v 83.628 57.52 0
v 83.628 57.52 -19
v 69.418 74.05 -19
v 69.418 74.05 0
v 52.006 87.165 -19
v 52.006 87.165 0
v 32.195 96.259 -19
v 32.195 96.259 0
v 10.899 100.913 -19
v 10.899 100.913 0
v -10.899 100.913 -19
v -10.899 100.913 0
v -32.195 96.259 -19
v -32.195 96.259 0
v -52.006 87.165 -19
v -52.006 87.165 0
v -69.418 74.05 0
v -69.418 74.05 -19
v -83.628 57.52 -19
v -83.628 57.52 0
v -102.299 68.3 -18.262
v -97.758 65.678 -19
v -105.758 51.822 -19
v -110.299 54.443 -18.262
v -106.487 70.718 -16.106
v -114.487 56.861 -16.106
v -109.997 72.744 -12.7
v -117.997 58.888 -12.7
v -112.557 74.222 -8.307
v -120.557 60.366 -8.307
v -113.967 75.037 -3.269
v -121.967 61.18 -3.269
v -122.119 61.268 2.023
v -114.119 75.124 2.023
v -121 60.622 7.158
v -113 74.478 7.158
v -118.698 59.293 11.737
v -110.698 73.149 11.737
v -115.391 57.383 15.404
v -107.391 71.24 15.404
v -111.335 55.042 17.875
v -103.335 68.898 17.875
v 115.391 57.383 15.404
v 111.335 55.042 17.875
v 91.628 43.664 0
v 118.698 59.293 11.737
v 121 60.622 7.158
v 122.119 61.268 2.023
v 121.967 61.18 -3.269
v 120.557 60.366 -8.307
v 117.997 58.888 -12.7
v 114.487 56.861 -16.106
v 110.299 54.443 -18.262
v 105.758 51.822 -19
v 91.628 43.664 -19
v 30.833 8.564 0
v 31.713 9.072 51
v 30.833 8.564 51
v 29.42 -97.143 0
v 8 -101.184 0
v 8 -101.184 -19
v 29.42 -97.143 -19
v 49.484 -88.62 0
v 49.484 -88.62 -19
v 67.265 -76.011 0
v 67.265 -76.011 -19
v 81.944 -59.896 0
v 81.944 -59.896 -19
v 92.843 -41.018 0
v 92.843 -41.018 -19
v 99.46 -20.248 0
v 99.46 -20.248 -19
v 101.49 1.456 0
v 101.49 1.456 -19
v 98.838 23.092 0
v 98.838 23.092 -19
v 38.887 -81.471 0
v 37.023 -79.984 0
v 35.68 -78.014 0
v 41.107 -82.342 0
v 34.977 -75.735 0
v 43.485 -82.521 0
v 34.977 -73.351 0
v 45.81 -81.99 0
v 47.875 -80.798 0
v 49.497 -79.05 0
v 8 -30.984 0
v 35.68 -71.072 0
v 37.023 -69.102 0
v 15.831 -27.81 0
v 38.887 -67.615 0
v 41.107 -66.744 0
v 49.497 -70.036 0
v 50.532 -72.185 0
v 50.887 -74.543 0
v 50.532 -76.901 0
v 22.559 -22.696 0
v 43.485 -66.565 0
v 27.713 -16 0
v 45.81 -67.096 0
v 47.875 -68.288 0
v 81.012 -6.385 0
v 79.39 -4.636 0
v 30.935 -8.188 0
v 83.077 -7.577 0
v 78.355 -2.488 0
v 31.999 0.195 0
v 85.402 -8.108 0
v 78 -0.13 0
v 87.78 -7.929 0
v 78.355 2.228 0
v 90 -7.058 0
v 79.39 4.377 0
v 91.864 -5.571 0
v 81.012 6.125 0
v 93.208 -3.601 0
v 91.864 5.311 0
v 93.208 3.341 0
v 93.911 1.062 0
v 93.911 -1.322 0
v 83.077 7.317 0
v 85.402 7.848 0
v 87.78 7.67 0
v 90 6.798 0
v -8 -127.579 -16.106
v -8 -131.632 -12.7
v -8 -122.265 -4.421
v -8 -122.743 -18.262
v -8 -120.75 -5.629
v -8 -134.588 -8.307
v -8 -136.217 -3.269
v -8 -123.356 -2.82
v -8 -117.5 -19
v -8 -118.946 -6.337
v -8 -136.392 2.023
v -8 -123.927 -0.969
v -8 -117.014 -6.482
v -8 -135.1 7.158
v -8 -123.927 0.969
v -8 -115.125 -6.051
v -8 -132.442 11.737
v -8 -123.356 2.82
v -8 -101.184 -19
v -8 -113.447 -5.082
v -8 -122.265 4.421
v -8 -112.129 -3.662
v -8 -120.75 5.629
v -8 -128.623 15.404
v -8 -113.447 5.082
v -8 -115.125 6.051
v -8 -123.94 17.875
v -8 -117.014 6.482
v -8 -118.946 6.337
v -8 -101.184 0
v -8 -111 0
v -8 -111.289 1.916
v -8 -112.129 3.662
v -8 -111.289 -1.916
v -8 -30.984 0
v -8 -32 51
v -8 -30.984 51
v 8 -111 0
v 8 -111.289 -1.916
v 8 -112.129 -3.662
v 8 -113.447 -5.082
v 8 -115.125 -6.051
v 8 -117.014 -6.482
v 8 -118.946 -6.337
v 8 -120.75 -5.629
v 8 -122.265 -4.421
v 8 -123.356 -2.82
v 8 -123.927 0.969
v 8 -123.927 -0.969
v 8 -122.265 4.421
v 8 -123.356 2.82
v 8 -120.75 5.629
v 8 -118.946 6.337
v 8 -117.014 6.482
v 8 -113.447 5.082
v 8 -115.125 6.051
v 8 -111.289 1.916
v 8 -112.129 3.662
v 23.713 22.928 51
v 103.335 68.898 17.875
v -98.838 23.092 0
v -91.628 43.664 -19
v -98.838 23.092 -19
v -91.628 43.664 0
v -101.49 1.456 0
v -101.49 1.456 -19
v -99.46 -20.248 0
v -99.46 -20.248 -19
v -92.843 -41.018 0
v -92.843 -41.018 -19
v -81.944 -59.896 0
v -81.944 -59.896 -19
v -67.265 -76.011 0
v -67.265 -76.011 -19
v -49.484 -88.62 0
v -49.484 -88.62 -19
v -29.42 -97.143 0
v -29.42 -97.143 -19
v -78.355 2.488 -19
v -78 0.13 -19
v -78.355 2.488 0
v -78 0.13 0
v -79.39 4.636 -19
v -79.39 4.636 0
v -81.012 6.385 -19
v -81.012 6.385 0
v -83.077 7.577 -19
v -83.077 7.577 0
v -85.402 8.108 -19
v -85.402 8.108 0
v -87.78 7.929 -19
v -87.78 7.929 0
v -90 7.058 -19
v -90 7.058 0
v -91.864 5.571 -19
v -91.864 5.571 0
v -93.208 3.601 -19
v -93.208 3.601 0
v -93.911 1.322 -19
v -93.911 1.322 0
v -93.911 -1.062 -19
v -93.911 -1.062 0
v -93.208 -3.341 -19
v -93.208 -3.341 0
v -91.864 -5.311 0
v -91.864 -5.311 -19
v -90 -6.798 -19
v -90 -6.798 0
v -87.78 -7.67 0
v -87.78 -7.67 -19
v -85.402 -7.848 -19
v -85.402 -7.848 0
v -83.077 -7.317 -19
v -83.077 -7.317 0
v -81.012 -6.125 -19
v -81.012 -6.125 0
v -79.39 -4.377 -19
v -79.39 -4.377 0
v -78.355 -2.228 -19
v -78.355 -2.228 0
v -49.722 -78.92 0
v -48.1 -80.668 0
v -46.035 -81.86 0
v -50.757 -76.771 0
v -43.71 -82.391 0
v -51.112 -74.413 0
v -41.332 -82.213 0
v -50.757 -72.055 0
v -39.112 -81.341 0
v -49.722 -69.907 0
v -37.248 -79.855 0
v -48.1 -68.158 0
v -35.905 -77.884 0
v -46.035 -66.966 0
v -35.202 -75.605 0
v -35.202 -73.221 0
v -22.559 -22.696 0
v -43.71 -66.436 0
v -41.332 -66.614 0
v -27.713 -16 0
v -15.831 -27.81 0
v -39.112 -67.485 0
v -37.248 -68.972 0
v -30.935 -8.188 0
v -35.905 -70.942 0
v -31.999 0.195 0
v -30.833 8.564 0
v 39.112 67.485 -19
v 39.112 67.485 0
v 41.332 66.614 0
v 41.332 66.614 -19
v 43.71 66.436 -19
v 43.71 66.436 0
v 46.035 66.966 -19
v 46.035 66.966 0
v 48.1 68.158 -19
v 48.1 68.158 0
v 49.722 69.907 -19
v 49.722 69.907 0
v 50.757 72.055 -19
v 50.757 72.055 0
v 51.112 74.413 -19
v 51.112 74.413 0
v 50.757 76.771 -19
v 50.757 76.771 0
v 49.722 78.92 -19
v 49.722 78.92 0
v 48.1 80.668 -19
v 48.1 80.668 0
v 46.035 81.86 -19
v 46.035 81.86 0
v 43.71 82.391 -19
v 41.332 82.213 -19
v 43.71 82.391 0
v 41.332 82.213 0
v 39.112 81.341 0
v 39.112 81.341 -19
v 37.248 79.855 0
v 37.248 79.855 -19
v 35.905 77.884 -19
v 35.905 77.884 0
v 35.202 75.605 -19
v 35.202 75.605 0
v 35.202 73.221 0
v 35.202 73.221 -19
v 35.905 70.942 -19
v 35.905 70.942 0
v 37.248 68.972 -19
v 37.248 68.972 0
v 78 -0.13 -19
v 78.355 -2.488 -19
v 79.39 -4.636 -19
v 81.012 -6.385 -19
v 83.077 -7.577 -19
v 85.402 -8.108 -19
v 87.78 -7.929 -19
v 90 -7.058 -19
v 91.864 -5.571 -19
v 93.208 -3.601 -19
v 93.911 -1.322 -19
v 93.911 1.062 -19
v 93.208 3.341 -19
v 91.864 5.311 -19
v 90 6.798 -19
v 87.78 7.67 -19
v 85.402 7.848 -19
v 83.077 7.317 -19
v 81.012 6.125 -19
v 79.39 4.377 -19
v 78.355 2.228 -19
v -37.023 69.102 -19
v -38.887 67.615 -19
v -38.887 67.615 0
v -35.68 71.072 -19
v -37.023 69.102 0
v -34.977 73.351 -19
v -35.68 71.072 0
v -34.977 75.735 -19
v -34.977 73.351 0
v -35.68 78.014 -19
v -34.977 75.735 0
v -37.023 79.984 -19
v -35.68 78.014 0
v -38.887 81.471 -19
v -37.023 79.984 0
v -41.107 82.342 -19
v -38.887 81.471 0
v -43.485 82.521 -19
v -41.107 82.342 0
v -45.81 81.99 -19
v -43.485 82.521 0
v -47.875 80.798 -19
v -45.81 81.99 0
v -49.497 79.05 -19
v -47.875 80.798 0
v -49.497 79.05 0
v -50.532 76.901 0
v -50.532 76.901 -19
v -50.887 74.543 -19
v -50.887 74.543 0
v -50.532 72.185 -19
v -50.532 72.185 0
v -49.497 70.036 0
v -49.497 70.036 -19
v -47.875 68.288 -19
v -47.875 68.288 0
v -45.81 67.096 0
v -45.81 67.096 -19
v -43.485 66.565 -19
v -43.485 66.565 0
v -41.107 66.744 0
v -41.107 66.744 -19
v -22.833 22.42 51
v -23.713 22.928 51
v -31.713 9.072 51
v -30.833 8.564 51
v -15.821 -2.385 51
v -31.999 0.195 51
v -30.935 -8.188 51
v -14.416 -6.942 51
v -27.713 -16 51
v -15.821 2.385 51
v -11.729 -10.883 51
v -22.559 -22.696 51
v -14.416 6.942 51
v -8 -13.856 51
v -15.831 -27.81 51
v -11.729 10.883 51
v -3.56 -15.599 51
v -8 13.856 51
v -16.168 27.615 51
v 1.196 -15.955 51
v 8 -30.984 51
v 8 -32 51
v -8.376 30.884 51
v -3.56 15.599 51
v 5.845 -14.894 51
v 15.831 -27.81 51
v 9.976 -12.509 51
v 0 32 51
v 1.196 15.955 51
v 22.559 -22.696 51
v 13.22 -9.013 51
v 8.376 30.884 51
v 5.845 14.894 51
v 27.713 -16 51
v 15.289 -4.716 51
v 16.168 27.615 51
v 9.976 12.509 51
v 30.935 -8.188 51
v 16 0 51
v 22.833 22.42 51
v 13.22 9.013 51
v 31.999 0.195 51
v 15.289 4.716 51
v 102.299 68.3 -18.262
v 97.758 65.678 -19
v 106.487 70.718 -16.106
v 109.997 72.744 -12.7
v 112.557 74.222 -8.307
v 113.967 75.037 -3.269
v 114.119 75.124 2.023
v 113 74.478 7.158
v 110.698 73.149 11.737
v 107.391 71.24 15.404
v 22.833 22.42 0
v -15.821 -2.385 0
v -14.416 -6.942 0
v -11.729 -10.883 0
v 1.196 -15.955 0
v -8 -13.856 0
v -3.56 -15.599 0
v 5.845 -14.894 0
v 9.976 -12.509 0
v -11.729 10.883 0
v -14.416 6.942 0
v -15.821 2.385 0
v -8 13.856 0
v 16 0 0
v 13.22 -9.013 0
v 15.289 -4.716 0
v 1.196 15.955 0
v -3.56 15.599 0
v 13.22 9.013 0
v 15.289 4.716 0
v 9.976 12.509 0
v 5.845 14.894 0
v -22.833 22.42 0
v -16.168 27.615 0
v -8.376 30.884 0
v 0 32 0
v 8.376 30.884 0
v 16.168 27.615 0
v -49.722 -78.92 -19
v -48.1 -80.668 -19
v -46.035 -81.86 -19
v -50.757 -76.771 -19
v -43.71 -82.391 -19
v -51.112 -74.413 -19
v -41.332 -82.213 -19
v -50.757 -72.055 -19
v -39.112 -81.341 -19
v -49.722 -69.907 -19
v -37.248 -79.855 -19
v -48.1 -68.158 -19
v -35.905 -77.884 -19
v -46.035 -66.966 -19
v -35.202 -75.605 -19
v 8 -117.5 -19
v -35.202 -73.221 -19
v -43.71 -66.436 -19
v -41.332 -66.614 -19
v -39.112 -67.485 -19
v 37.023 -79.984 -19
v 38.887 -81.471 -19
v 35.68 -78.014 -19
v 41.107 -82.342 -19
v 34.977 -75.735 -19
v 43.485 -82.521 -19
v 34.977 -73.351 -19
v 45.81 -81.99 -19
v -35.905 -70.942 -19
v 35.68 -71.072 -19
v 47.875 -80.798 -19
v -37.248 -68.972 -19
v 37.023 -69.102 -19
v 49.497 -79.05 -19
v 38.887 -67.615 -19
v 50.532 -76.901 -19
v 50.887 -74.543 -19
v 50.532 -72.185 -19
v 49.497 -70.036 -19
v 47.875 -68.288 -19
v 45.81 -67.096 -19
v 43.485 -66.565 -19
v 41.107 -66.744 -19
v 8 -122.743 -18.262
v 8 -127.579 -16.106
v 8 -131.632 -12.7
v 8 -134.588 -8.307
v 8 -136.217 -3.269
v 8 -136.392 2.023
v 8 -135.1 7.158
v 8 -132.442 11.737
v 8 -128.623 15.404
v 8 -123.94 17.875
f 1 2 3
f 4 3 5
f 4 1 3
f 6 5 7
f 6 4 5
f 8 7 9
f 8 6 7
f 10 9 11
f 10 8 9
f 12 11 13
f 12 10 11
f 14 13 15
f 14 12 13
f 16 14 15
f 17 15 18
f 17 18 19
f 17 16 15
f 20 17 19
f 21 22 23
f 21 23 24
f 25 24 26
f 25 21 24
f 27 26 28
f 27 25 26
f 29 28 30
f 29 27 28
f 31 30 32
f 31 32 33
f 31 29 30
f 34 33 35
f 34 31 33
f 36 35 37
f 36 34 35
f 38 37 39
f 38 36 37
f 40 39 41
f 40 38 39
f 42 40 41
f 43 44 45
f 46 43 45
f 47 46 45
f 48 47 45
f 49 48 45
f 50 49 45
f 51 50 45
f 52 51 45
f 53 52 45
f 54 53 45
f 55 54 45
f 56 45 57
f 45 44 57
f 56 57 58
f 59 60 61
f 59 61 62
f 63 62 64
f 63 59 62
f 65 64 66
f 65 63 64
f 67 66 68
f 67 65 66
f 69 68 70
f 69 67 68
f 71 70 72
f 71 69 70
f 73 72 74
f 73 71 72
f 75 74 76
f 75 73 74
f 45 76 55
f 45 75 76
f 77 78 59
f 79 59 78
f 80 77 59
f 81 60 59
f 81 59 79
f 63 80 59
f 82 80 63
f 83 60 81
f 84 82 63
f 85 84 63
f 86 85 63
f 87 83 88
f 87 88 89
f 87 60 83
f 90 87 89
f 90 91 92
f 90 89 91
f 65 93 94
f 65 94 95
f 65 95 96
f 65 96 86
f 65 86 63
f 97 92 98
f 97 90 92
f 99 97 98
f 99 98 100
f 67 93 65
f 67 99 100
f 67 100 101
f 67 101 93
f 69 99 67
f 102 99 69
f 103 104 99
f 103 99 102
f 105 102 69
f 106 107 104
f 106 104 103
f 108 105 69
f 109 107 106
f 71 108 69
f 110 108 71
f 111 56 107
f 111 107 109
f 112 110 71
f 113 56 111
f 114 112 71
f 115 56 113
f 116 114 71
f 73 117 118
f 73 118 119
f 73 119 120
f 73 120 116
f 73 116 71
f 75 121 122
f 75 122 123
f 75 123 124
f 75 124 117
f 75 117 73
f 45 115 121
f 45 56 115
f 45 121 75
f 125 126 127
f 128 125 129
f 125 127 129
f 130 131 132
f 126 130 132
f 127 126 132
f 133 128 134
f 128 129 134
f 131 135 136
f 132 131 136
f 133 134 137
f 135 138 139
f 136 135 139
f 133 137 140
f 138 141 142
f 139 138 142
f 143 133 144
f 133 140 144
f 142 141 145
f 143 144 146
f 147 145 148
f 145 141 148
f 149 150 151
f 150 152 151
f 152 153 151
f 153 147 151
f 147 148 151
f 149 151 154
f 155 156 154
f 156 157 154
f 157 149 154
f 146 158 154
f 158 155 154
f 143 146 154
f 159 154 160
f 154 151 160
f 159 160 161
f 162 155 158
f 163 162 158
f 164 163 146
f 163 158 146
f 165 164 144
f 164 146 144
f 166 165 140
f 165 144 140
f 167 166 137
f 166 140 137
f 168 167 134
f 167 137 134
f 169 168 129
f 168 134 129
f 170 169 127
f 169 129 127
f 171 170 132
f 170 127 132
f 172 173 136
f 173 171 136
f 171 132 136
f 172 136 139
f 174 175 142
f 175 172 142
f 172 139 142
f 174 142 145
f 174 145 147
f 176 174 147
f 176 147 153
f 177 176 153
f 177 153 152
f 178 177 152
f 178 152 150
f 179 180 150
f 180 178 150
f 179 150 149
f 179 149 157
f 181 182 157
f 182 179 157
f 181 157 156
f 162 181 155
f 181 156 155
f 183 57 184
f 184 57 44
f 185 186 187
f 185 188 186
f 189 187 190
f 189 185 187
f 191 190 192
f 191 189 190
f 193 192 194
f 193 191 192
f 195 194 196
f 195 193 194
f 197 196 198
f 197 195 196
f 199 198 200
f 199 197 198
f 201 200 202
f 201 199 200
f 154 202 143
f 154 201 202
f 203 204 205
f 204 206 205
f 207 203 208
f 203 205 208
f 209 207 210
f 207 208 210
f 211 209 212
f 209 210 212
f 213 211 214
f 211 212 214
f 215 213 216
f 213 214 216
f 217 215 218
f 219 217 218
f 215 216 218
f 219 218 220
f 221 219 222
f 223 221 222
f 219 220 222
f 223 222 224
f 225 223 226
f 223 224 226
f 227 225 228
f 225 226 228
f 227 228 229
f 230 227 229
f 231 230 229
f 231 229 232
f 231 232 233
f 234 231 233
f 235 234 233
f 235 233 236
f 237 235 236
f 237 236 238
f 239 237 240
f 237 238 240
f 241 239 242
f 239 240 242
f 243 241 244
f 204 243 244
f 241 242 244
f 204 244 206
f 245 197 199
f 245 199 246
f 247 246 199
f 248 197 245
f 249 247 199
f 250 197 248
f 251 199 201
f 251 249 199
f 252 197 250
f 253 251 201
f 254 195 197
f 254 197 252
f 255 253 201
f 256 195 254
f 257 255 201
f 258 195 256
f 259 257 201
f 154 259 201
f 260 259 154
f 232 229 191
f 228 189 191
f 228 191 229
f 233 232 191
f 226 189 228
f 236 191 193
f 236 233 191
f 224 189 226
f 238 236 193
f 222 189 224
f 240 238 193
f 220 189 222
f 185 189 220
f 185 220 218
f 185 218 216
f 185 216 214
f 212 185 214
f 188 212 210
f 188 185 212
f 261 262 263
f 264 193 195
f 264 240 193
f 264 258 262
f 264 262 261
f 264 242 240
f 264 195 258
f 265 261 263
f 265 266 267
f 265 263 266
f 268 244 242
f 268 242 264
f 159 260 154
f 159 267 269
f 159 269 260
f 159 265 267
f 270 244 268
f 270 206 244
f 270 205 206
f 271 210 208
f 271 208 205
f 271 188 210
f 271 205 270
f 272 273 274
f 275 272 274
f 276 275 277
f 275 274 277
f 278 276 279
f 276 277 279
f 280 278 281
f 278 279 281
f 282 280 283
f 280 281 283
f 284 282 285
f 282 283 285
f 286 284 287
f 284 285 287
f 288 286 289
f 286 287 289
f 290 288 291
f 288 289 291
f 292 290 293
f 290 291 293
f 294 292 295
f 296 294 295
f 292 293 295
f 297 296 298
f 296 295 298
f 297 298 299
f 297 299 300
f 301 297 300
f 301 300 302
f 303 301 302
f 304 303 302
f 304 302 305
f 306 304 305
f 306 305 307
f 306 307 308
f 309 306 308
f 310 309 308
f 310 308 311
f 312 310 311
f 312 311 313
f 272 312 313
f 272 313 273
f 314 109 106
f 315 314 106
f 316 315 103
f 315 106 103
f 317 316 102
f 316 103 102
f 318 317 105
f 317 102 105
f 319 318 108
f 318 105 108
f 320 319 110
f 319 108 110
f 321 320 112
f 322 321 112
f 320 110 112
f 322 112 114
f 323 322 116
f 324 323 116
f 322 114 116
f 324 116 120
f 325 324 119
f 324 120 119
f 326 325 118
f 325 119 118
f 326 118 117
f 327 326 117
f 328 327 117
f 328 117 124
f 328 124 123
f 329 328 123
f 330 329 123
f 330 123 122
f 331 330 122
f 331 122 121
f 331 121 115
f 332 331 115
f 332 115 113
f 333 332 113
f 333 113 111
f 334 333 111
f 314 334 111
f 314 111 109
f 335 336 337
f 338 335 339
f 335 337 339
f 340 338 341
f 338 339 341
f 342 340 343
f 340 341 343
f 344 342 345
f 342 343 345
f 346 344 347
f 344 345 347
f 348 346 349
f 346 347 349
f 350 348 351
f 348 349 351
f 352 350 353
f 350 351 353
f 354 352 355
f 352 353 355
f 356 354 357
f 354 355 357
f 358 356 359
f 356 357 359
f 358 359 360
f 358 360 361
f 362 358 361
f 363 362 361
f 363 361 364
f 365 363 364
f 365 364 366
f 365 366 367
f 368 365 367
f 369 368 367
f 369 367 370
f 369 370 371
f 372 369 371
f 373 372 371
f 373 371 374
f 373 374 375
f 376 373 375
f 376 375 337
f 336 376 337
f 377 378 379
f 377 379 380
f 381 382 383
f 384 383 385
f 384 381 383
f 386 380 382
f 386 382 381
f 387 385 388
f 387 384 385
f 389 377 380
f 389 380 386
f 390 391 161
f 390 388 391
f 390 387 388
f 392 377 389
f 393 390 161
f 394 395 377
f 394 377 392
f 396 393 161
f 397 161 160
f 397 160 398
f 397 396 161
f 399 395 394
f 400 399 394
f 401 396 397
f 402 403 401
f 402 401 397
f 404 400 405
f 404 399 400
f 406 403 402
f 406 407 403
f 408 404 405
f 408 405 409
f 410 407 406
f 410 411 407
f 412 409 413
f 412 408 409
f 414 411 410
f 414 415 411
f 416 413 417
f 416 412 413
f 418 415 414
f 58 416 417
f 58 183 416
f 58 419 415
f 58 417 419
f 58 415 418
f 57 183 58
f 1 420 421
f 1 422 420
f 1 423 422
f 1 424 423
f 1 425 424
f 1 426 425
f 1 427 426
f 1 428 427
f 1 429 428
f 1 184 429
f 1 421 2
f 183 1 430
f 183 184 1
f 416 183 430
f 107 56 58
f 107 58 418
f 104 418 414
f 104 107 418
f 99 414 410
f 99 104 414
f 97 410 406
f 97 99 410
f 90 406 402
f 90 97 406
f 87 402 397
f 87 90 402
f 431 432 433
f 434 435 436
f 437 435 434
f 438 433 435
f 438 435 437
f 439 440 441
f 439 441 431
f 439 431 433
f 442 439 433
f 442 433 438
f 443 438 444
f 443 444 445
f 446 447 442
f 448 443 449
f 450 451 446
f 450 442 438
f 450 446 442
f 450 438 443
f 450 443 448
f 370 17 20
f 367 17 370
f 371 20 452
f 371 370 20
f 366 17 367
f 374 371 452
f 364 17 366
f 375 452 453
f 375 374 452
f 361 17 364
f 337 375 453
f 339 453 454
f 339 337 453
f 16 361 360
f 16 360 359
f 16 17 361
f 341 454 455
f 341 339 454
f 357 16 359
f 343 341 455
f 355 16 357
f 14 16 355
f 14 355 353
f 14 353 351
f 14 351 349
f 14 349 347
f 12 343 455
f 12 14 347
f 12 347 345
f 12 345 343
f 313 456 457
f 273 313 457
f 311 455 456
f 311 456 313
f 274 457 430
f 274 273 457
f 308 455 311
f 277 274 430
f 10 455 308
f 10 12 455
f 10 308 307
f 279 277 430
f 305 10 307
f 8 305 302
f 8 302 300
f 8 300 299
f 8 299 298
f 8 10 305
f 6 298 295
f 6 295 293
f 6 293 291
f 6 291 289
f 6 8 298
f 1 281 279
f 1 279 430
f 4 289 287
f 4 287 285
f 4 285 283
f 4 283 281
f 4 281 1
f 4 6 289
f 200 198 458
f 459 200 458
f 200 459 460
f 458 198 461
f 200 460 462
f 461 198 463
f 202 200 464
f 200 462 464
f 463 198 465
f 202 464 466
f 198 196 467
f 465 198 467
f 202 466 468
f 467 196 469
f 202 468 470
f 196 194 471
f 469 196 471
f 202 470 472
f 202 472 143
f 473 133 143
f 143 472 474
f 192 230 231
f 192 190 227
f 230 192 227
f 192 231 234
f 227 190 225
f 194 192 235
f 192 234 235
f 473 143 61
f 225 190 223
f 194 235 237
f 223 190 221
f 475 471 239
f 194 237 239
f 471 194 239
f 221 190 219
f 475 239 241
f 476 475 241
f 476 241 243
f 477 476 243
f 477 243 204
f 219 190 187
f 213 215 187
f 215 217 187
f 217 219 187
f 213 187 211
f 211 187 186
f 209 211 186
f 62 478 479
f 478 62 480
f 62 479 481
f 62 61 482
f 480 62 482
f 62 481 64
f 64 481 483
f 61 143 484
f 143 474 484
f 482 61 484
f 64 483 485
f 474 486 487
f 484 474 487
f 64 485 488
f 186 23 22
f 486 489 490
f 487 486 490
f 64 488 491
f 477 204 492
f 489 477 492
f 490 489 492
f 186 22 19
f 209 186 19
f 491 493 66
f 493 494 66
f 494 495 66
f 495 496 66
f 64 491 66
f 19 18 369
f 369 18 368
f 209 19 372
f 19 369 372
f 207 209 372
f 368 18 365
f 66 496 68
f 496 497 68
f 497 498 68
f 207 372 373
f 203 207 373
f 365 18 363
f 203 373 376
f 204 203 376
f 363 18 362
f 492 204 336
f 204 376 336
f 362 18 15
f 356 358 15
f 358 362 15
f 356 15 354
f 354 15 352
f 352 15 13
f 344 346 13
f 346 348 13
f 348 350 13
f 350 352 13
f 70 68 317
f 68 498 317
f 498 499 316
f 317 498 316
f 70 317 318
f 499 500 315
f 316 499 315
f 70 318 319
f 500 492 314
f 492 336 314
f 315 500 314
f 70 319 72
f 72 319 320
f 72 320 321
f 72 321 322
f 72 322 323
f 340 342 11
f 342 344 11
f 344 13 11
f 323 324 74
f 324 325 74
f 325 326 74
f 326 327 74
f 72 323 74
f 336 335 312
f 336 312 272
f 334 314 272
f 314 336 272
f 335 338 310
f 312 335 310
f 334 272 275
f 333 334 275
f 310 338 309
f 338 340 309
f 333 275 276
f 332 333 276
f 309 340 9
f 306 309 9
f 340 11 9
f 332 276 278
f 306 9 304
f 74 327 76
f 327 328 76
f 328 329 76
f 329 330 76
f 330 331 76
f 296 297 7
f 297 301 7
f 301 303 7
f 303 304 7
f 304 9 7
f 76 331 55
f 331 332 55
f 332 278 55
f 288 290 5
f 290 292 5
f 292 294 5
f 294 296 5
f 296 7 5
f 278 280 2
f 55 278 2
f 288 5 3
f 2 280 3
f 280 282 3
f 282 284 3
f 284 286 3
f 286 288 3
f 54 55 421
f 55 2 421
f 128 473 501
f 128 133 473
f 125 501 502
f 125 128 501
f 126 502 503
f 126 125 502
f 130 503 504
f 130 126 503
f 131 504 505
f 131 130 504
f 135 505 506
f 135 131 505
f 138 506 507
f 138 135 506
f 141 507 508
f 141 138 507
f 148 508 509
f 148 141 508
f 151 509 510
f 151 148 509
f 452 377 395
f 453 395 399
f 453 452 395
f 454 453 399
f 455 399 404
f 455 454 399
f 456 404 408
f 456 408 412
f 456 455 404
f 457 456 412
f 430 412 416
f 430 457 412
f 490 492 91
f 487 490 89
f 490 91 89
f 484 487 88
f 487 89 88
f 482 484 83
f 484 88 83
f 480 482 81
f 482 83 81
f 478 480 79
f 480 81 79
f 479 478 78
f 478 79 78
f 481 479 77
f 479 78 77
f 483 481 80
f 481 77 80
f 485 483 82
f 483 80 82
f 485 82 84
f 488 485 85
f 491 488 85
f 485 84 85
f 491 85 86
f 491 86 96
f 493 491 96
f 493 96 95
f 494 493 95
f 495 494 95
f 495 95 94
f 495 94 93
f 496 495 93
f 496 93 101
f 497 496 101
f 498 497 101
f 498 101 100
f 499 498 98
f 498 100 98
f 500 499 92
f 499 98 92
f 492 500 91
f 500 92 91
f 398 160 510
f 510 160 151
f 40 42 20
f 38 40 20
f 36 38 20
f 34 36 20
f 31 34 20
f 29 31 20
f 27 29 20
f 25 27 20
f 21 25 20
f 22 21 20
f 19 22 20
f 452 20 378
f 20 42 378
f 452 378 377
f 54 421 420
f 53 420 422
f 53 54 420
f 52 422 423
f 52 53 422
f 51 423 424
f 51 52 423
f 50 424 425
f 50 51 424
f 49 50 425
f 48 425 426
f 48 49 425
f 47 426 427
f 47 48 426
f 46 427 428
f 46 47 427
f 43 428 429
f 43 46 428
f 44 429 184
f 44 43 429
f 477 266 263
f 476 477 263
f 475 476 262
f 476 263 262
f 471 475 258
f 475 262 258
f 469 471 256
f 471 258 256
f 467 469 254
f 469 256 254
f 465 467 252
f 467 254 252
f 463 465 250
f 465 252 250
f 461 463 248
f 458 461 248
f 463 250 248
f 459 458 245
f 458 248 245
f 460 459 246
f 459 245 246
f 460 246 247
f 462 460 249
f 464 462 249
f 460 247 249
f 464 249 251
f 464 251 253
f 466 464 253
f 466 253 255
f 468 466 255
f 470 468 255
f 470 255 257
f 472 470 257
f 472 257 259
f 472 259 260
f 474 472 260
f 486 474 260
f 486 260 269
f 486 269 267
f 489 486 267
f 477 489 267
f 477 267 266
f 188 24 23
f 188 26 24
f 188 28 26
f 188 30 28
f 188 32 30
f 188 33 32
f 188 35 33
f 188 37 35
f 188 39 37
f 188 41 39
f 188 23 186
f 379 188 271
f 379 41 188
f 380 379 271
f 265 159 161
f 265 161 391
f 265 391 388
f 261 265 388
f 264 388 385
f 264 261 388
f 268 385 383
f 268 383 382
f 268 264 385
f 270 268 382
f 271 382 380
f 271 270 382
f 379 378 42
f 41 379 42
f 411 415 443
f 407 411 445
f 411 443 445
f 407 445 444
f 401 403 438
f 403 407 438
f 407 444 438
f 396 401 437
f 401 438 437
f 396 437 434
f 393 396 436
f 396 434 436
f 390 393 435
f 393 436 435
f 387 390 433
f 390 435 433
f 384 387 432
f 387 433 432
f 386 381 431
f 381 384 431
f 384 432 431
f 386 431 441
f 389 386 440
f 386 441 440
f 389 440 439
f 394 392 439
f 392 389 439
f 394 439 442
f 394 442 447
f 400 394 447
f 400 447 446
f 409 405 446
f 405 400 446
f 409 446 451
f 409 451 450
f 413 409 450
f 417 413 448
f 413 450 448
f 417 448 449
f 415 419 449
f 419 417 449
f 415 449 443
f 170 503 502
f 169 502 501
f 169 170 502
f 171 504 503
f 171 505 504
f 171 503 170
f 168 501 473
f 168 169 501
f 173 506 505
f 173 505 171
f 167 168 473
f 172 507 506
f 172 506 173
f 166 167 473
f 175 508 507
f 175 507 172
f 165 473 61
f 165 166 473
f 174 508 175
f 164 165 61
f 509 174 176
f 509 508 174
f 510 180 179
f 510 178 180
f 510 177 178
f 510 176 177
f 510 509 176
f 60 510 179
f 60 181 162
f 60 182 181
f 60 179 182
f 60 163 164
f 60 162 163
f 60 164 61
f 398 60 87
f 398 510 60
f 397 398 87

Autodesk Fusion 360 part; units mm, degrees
sketch "Sketch1" plane through (0, 0, 0) normal (0, 0, 1) x (1, 0, 0)
  circle A0 centre (0, 0) radius 101.5
  circle A1 centre (0, 0) radius 16
  circle A2 centre (0, 0) radius 32
  dimension "d1" = 203
  dimension "d2" = 32
  dimension "d3" = 64
extrude "Extrude1" add sketch "Sketch1" along normal blind 51 contours A2
extrude "Extrude2" add sketch "Sketch1" against normal blind 19 contours A0 | A1 | A2
sketch "Sketch2" plane through (0, 0, 0) normal (0, 0, 1) x (1, 0, 0)
  circle A0 centre (0, 0) radius 86
  circle A1 centre (0, 0) radius 32
  circle A2 centre (0, 0) radius 101.5
  circle A3 centre (0, 0) radius 32
  circle A4 centre (-85.9999, 0.1299) radius 8
  dimension "d8" = 172
  dimension "d9" = 64
  dimension "d10" = 64
  dimension "d11" = 203
  dimension "d12" = 64
  dimension "d13" = 16
extrude "Extrude3" cut sketch "Sketch2" against normal blind 30 contours A0 A4 | A0 A4 picked at (-83.3057, 0.1299) picked at (-88.639, 0.1339)
pattern_circular "C-Pattern1" count 6 over 360 about axis through (0, 0, 1.75) along (0, 0, 1) of "Extrude3"
ref_plane "WorkPlane2" through (-117.5, 0, 4.8107) normal (-1, 0, 0) x (0, 1, 0)
ref_plane "WorkPlane3" through (0, 0, 4.8107) normal (-1, 0, 0) x (0, 1, 0)
sketch "Sketch7" plane through (0, 0, 0) normal (0, 0, 1) x (1, 0, 0)
  line L0 (0, 0) -> (0, -117.5)
  circle A0 centre (0, -117.5) radius 6.5
  dimension "d26" = 117.5
  dimension "d27" = 13
extrude "Extrude7" cut sketch "Sketch7" along normal mid plane 16
sketch "Sketch10" plane through (0, 0, 0) normal (1, 0, 0) x (0, 1, 0)
  line L0 (0, 0) -> (-117.5, 0)
  circle A0 centre (-117.5, 0) radius 6.5
  circle A1 centre (-117.5, 0) radius 19
  circle A2 centre (-117.5, 0) radius 6.5
  dimension "d28" = 117.5
  dimension "d29" = 13
  dimension "d30" = 38
sketch "Sketch12" plane through (0, 0, 0) normal (1, 0, 0) x (0, 1, 0)
  line L0 (0, 0) -> (0, 51)
  line L1 (-123.9402, 17.8752) -> (-124.2542, 17.7621)
  circle A0 centre (-117.5, 0) radius 19
  line L2 (-32, 0) -> (-117.5, 0)
  line L3 (-117.5, 0) -> (-117.5, -10)
  line L4 (-117.5, -10) -> (-133.6555, -10)
  line L5 (-32, 51) -> (-123.9402, 17.8752)
  arc A1 (-98.5, 0) -> (-123.9402, 17.8752) centre (-117.5, 0) ccw
  arc A2 (-123.9402, 17.8752) -> (-133.6555, -10) centre (-117.5, 0) ccw
  line L6 (-32, 51) -> (-25, 51)
  line L7 (-25, 51) -> (-25, 0)
  line L8 (-25, 0) -> (-50, 0)
  line L9 (-25, 0) -> (-25, -19)
  line L10 (-25, -19) -> (-117.5, -19)
  dimension "d31" = 51
  dimension "d33" = 51
  dimension "d40" = 19
extrude "Extrude9" add sketch "Sketch12" along normal mid plane 16
extrude "Extrude8" cut sketch "Sketch10" along normal mid plane 16 contours A0 A2
pattern_circular "C-Pattern2" count 3 over 360 about axis through (0, 0, 0) along (0, 0, 1) of "Extrude8", "Extrude9"
